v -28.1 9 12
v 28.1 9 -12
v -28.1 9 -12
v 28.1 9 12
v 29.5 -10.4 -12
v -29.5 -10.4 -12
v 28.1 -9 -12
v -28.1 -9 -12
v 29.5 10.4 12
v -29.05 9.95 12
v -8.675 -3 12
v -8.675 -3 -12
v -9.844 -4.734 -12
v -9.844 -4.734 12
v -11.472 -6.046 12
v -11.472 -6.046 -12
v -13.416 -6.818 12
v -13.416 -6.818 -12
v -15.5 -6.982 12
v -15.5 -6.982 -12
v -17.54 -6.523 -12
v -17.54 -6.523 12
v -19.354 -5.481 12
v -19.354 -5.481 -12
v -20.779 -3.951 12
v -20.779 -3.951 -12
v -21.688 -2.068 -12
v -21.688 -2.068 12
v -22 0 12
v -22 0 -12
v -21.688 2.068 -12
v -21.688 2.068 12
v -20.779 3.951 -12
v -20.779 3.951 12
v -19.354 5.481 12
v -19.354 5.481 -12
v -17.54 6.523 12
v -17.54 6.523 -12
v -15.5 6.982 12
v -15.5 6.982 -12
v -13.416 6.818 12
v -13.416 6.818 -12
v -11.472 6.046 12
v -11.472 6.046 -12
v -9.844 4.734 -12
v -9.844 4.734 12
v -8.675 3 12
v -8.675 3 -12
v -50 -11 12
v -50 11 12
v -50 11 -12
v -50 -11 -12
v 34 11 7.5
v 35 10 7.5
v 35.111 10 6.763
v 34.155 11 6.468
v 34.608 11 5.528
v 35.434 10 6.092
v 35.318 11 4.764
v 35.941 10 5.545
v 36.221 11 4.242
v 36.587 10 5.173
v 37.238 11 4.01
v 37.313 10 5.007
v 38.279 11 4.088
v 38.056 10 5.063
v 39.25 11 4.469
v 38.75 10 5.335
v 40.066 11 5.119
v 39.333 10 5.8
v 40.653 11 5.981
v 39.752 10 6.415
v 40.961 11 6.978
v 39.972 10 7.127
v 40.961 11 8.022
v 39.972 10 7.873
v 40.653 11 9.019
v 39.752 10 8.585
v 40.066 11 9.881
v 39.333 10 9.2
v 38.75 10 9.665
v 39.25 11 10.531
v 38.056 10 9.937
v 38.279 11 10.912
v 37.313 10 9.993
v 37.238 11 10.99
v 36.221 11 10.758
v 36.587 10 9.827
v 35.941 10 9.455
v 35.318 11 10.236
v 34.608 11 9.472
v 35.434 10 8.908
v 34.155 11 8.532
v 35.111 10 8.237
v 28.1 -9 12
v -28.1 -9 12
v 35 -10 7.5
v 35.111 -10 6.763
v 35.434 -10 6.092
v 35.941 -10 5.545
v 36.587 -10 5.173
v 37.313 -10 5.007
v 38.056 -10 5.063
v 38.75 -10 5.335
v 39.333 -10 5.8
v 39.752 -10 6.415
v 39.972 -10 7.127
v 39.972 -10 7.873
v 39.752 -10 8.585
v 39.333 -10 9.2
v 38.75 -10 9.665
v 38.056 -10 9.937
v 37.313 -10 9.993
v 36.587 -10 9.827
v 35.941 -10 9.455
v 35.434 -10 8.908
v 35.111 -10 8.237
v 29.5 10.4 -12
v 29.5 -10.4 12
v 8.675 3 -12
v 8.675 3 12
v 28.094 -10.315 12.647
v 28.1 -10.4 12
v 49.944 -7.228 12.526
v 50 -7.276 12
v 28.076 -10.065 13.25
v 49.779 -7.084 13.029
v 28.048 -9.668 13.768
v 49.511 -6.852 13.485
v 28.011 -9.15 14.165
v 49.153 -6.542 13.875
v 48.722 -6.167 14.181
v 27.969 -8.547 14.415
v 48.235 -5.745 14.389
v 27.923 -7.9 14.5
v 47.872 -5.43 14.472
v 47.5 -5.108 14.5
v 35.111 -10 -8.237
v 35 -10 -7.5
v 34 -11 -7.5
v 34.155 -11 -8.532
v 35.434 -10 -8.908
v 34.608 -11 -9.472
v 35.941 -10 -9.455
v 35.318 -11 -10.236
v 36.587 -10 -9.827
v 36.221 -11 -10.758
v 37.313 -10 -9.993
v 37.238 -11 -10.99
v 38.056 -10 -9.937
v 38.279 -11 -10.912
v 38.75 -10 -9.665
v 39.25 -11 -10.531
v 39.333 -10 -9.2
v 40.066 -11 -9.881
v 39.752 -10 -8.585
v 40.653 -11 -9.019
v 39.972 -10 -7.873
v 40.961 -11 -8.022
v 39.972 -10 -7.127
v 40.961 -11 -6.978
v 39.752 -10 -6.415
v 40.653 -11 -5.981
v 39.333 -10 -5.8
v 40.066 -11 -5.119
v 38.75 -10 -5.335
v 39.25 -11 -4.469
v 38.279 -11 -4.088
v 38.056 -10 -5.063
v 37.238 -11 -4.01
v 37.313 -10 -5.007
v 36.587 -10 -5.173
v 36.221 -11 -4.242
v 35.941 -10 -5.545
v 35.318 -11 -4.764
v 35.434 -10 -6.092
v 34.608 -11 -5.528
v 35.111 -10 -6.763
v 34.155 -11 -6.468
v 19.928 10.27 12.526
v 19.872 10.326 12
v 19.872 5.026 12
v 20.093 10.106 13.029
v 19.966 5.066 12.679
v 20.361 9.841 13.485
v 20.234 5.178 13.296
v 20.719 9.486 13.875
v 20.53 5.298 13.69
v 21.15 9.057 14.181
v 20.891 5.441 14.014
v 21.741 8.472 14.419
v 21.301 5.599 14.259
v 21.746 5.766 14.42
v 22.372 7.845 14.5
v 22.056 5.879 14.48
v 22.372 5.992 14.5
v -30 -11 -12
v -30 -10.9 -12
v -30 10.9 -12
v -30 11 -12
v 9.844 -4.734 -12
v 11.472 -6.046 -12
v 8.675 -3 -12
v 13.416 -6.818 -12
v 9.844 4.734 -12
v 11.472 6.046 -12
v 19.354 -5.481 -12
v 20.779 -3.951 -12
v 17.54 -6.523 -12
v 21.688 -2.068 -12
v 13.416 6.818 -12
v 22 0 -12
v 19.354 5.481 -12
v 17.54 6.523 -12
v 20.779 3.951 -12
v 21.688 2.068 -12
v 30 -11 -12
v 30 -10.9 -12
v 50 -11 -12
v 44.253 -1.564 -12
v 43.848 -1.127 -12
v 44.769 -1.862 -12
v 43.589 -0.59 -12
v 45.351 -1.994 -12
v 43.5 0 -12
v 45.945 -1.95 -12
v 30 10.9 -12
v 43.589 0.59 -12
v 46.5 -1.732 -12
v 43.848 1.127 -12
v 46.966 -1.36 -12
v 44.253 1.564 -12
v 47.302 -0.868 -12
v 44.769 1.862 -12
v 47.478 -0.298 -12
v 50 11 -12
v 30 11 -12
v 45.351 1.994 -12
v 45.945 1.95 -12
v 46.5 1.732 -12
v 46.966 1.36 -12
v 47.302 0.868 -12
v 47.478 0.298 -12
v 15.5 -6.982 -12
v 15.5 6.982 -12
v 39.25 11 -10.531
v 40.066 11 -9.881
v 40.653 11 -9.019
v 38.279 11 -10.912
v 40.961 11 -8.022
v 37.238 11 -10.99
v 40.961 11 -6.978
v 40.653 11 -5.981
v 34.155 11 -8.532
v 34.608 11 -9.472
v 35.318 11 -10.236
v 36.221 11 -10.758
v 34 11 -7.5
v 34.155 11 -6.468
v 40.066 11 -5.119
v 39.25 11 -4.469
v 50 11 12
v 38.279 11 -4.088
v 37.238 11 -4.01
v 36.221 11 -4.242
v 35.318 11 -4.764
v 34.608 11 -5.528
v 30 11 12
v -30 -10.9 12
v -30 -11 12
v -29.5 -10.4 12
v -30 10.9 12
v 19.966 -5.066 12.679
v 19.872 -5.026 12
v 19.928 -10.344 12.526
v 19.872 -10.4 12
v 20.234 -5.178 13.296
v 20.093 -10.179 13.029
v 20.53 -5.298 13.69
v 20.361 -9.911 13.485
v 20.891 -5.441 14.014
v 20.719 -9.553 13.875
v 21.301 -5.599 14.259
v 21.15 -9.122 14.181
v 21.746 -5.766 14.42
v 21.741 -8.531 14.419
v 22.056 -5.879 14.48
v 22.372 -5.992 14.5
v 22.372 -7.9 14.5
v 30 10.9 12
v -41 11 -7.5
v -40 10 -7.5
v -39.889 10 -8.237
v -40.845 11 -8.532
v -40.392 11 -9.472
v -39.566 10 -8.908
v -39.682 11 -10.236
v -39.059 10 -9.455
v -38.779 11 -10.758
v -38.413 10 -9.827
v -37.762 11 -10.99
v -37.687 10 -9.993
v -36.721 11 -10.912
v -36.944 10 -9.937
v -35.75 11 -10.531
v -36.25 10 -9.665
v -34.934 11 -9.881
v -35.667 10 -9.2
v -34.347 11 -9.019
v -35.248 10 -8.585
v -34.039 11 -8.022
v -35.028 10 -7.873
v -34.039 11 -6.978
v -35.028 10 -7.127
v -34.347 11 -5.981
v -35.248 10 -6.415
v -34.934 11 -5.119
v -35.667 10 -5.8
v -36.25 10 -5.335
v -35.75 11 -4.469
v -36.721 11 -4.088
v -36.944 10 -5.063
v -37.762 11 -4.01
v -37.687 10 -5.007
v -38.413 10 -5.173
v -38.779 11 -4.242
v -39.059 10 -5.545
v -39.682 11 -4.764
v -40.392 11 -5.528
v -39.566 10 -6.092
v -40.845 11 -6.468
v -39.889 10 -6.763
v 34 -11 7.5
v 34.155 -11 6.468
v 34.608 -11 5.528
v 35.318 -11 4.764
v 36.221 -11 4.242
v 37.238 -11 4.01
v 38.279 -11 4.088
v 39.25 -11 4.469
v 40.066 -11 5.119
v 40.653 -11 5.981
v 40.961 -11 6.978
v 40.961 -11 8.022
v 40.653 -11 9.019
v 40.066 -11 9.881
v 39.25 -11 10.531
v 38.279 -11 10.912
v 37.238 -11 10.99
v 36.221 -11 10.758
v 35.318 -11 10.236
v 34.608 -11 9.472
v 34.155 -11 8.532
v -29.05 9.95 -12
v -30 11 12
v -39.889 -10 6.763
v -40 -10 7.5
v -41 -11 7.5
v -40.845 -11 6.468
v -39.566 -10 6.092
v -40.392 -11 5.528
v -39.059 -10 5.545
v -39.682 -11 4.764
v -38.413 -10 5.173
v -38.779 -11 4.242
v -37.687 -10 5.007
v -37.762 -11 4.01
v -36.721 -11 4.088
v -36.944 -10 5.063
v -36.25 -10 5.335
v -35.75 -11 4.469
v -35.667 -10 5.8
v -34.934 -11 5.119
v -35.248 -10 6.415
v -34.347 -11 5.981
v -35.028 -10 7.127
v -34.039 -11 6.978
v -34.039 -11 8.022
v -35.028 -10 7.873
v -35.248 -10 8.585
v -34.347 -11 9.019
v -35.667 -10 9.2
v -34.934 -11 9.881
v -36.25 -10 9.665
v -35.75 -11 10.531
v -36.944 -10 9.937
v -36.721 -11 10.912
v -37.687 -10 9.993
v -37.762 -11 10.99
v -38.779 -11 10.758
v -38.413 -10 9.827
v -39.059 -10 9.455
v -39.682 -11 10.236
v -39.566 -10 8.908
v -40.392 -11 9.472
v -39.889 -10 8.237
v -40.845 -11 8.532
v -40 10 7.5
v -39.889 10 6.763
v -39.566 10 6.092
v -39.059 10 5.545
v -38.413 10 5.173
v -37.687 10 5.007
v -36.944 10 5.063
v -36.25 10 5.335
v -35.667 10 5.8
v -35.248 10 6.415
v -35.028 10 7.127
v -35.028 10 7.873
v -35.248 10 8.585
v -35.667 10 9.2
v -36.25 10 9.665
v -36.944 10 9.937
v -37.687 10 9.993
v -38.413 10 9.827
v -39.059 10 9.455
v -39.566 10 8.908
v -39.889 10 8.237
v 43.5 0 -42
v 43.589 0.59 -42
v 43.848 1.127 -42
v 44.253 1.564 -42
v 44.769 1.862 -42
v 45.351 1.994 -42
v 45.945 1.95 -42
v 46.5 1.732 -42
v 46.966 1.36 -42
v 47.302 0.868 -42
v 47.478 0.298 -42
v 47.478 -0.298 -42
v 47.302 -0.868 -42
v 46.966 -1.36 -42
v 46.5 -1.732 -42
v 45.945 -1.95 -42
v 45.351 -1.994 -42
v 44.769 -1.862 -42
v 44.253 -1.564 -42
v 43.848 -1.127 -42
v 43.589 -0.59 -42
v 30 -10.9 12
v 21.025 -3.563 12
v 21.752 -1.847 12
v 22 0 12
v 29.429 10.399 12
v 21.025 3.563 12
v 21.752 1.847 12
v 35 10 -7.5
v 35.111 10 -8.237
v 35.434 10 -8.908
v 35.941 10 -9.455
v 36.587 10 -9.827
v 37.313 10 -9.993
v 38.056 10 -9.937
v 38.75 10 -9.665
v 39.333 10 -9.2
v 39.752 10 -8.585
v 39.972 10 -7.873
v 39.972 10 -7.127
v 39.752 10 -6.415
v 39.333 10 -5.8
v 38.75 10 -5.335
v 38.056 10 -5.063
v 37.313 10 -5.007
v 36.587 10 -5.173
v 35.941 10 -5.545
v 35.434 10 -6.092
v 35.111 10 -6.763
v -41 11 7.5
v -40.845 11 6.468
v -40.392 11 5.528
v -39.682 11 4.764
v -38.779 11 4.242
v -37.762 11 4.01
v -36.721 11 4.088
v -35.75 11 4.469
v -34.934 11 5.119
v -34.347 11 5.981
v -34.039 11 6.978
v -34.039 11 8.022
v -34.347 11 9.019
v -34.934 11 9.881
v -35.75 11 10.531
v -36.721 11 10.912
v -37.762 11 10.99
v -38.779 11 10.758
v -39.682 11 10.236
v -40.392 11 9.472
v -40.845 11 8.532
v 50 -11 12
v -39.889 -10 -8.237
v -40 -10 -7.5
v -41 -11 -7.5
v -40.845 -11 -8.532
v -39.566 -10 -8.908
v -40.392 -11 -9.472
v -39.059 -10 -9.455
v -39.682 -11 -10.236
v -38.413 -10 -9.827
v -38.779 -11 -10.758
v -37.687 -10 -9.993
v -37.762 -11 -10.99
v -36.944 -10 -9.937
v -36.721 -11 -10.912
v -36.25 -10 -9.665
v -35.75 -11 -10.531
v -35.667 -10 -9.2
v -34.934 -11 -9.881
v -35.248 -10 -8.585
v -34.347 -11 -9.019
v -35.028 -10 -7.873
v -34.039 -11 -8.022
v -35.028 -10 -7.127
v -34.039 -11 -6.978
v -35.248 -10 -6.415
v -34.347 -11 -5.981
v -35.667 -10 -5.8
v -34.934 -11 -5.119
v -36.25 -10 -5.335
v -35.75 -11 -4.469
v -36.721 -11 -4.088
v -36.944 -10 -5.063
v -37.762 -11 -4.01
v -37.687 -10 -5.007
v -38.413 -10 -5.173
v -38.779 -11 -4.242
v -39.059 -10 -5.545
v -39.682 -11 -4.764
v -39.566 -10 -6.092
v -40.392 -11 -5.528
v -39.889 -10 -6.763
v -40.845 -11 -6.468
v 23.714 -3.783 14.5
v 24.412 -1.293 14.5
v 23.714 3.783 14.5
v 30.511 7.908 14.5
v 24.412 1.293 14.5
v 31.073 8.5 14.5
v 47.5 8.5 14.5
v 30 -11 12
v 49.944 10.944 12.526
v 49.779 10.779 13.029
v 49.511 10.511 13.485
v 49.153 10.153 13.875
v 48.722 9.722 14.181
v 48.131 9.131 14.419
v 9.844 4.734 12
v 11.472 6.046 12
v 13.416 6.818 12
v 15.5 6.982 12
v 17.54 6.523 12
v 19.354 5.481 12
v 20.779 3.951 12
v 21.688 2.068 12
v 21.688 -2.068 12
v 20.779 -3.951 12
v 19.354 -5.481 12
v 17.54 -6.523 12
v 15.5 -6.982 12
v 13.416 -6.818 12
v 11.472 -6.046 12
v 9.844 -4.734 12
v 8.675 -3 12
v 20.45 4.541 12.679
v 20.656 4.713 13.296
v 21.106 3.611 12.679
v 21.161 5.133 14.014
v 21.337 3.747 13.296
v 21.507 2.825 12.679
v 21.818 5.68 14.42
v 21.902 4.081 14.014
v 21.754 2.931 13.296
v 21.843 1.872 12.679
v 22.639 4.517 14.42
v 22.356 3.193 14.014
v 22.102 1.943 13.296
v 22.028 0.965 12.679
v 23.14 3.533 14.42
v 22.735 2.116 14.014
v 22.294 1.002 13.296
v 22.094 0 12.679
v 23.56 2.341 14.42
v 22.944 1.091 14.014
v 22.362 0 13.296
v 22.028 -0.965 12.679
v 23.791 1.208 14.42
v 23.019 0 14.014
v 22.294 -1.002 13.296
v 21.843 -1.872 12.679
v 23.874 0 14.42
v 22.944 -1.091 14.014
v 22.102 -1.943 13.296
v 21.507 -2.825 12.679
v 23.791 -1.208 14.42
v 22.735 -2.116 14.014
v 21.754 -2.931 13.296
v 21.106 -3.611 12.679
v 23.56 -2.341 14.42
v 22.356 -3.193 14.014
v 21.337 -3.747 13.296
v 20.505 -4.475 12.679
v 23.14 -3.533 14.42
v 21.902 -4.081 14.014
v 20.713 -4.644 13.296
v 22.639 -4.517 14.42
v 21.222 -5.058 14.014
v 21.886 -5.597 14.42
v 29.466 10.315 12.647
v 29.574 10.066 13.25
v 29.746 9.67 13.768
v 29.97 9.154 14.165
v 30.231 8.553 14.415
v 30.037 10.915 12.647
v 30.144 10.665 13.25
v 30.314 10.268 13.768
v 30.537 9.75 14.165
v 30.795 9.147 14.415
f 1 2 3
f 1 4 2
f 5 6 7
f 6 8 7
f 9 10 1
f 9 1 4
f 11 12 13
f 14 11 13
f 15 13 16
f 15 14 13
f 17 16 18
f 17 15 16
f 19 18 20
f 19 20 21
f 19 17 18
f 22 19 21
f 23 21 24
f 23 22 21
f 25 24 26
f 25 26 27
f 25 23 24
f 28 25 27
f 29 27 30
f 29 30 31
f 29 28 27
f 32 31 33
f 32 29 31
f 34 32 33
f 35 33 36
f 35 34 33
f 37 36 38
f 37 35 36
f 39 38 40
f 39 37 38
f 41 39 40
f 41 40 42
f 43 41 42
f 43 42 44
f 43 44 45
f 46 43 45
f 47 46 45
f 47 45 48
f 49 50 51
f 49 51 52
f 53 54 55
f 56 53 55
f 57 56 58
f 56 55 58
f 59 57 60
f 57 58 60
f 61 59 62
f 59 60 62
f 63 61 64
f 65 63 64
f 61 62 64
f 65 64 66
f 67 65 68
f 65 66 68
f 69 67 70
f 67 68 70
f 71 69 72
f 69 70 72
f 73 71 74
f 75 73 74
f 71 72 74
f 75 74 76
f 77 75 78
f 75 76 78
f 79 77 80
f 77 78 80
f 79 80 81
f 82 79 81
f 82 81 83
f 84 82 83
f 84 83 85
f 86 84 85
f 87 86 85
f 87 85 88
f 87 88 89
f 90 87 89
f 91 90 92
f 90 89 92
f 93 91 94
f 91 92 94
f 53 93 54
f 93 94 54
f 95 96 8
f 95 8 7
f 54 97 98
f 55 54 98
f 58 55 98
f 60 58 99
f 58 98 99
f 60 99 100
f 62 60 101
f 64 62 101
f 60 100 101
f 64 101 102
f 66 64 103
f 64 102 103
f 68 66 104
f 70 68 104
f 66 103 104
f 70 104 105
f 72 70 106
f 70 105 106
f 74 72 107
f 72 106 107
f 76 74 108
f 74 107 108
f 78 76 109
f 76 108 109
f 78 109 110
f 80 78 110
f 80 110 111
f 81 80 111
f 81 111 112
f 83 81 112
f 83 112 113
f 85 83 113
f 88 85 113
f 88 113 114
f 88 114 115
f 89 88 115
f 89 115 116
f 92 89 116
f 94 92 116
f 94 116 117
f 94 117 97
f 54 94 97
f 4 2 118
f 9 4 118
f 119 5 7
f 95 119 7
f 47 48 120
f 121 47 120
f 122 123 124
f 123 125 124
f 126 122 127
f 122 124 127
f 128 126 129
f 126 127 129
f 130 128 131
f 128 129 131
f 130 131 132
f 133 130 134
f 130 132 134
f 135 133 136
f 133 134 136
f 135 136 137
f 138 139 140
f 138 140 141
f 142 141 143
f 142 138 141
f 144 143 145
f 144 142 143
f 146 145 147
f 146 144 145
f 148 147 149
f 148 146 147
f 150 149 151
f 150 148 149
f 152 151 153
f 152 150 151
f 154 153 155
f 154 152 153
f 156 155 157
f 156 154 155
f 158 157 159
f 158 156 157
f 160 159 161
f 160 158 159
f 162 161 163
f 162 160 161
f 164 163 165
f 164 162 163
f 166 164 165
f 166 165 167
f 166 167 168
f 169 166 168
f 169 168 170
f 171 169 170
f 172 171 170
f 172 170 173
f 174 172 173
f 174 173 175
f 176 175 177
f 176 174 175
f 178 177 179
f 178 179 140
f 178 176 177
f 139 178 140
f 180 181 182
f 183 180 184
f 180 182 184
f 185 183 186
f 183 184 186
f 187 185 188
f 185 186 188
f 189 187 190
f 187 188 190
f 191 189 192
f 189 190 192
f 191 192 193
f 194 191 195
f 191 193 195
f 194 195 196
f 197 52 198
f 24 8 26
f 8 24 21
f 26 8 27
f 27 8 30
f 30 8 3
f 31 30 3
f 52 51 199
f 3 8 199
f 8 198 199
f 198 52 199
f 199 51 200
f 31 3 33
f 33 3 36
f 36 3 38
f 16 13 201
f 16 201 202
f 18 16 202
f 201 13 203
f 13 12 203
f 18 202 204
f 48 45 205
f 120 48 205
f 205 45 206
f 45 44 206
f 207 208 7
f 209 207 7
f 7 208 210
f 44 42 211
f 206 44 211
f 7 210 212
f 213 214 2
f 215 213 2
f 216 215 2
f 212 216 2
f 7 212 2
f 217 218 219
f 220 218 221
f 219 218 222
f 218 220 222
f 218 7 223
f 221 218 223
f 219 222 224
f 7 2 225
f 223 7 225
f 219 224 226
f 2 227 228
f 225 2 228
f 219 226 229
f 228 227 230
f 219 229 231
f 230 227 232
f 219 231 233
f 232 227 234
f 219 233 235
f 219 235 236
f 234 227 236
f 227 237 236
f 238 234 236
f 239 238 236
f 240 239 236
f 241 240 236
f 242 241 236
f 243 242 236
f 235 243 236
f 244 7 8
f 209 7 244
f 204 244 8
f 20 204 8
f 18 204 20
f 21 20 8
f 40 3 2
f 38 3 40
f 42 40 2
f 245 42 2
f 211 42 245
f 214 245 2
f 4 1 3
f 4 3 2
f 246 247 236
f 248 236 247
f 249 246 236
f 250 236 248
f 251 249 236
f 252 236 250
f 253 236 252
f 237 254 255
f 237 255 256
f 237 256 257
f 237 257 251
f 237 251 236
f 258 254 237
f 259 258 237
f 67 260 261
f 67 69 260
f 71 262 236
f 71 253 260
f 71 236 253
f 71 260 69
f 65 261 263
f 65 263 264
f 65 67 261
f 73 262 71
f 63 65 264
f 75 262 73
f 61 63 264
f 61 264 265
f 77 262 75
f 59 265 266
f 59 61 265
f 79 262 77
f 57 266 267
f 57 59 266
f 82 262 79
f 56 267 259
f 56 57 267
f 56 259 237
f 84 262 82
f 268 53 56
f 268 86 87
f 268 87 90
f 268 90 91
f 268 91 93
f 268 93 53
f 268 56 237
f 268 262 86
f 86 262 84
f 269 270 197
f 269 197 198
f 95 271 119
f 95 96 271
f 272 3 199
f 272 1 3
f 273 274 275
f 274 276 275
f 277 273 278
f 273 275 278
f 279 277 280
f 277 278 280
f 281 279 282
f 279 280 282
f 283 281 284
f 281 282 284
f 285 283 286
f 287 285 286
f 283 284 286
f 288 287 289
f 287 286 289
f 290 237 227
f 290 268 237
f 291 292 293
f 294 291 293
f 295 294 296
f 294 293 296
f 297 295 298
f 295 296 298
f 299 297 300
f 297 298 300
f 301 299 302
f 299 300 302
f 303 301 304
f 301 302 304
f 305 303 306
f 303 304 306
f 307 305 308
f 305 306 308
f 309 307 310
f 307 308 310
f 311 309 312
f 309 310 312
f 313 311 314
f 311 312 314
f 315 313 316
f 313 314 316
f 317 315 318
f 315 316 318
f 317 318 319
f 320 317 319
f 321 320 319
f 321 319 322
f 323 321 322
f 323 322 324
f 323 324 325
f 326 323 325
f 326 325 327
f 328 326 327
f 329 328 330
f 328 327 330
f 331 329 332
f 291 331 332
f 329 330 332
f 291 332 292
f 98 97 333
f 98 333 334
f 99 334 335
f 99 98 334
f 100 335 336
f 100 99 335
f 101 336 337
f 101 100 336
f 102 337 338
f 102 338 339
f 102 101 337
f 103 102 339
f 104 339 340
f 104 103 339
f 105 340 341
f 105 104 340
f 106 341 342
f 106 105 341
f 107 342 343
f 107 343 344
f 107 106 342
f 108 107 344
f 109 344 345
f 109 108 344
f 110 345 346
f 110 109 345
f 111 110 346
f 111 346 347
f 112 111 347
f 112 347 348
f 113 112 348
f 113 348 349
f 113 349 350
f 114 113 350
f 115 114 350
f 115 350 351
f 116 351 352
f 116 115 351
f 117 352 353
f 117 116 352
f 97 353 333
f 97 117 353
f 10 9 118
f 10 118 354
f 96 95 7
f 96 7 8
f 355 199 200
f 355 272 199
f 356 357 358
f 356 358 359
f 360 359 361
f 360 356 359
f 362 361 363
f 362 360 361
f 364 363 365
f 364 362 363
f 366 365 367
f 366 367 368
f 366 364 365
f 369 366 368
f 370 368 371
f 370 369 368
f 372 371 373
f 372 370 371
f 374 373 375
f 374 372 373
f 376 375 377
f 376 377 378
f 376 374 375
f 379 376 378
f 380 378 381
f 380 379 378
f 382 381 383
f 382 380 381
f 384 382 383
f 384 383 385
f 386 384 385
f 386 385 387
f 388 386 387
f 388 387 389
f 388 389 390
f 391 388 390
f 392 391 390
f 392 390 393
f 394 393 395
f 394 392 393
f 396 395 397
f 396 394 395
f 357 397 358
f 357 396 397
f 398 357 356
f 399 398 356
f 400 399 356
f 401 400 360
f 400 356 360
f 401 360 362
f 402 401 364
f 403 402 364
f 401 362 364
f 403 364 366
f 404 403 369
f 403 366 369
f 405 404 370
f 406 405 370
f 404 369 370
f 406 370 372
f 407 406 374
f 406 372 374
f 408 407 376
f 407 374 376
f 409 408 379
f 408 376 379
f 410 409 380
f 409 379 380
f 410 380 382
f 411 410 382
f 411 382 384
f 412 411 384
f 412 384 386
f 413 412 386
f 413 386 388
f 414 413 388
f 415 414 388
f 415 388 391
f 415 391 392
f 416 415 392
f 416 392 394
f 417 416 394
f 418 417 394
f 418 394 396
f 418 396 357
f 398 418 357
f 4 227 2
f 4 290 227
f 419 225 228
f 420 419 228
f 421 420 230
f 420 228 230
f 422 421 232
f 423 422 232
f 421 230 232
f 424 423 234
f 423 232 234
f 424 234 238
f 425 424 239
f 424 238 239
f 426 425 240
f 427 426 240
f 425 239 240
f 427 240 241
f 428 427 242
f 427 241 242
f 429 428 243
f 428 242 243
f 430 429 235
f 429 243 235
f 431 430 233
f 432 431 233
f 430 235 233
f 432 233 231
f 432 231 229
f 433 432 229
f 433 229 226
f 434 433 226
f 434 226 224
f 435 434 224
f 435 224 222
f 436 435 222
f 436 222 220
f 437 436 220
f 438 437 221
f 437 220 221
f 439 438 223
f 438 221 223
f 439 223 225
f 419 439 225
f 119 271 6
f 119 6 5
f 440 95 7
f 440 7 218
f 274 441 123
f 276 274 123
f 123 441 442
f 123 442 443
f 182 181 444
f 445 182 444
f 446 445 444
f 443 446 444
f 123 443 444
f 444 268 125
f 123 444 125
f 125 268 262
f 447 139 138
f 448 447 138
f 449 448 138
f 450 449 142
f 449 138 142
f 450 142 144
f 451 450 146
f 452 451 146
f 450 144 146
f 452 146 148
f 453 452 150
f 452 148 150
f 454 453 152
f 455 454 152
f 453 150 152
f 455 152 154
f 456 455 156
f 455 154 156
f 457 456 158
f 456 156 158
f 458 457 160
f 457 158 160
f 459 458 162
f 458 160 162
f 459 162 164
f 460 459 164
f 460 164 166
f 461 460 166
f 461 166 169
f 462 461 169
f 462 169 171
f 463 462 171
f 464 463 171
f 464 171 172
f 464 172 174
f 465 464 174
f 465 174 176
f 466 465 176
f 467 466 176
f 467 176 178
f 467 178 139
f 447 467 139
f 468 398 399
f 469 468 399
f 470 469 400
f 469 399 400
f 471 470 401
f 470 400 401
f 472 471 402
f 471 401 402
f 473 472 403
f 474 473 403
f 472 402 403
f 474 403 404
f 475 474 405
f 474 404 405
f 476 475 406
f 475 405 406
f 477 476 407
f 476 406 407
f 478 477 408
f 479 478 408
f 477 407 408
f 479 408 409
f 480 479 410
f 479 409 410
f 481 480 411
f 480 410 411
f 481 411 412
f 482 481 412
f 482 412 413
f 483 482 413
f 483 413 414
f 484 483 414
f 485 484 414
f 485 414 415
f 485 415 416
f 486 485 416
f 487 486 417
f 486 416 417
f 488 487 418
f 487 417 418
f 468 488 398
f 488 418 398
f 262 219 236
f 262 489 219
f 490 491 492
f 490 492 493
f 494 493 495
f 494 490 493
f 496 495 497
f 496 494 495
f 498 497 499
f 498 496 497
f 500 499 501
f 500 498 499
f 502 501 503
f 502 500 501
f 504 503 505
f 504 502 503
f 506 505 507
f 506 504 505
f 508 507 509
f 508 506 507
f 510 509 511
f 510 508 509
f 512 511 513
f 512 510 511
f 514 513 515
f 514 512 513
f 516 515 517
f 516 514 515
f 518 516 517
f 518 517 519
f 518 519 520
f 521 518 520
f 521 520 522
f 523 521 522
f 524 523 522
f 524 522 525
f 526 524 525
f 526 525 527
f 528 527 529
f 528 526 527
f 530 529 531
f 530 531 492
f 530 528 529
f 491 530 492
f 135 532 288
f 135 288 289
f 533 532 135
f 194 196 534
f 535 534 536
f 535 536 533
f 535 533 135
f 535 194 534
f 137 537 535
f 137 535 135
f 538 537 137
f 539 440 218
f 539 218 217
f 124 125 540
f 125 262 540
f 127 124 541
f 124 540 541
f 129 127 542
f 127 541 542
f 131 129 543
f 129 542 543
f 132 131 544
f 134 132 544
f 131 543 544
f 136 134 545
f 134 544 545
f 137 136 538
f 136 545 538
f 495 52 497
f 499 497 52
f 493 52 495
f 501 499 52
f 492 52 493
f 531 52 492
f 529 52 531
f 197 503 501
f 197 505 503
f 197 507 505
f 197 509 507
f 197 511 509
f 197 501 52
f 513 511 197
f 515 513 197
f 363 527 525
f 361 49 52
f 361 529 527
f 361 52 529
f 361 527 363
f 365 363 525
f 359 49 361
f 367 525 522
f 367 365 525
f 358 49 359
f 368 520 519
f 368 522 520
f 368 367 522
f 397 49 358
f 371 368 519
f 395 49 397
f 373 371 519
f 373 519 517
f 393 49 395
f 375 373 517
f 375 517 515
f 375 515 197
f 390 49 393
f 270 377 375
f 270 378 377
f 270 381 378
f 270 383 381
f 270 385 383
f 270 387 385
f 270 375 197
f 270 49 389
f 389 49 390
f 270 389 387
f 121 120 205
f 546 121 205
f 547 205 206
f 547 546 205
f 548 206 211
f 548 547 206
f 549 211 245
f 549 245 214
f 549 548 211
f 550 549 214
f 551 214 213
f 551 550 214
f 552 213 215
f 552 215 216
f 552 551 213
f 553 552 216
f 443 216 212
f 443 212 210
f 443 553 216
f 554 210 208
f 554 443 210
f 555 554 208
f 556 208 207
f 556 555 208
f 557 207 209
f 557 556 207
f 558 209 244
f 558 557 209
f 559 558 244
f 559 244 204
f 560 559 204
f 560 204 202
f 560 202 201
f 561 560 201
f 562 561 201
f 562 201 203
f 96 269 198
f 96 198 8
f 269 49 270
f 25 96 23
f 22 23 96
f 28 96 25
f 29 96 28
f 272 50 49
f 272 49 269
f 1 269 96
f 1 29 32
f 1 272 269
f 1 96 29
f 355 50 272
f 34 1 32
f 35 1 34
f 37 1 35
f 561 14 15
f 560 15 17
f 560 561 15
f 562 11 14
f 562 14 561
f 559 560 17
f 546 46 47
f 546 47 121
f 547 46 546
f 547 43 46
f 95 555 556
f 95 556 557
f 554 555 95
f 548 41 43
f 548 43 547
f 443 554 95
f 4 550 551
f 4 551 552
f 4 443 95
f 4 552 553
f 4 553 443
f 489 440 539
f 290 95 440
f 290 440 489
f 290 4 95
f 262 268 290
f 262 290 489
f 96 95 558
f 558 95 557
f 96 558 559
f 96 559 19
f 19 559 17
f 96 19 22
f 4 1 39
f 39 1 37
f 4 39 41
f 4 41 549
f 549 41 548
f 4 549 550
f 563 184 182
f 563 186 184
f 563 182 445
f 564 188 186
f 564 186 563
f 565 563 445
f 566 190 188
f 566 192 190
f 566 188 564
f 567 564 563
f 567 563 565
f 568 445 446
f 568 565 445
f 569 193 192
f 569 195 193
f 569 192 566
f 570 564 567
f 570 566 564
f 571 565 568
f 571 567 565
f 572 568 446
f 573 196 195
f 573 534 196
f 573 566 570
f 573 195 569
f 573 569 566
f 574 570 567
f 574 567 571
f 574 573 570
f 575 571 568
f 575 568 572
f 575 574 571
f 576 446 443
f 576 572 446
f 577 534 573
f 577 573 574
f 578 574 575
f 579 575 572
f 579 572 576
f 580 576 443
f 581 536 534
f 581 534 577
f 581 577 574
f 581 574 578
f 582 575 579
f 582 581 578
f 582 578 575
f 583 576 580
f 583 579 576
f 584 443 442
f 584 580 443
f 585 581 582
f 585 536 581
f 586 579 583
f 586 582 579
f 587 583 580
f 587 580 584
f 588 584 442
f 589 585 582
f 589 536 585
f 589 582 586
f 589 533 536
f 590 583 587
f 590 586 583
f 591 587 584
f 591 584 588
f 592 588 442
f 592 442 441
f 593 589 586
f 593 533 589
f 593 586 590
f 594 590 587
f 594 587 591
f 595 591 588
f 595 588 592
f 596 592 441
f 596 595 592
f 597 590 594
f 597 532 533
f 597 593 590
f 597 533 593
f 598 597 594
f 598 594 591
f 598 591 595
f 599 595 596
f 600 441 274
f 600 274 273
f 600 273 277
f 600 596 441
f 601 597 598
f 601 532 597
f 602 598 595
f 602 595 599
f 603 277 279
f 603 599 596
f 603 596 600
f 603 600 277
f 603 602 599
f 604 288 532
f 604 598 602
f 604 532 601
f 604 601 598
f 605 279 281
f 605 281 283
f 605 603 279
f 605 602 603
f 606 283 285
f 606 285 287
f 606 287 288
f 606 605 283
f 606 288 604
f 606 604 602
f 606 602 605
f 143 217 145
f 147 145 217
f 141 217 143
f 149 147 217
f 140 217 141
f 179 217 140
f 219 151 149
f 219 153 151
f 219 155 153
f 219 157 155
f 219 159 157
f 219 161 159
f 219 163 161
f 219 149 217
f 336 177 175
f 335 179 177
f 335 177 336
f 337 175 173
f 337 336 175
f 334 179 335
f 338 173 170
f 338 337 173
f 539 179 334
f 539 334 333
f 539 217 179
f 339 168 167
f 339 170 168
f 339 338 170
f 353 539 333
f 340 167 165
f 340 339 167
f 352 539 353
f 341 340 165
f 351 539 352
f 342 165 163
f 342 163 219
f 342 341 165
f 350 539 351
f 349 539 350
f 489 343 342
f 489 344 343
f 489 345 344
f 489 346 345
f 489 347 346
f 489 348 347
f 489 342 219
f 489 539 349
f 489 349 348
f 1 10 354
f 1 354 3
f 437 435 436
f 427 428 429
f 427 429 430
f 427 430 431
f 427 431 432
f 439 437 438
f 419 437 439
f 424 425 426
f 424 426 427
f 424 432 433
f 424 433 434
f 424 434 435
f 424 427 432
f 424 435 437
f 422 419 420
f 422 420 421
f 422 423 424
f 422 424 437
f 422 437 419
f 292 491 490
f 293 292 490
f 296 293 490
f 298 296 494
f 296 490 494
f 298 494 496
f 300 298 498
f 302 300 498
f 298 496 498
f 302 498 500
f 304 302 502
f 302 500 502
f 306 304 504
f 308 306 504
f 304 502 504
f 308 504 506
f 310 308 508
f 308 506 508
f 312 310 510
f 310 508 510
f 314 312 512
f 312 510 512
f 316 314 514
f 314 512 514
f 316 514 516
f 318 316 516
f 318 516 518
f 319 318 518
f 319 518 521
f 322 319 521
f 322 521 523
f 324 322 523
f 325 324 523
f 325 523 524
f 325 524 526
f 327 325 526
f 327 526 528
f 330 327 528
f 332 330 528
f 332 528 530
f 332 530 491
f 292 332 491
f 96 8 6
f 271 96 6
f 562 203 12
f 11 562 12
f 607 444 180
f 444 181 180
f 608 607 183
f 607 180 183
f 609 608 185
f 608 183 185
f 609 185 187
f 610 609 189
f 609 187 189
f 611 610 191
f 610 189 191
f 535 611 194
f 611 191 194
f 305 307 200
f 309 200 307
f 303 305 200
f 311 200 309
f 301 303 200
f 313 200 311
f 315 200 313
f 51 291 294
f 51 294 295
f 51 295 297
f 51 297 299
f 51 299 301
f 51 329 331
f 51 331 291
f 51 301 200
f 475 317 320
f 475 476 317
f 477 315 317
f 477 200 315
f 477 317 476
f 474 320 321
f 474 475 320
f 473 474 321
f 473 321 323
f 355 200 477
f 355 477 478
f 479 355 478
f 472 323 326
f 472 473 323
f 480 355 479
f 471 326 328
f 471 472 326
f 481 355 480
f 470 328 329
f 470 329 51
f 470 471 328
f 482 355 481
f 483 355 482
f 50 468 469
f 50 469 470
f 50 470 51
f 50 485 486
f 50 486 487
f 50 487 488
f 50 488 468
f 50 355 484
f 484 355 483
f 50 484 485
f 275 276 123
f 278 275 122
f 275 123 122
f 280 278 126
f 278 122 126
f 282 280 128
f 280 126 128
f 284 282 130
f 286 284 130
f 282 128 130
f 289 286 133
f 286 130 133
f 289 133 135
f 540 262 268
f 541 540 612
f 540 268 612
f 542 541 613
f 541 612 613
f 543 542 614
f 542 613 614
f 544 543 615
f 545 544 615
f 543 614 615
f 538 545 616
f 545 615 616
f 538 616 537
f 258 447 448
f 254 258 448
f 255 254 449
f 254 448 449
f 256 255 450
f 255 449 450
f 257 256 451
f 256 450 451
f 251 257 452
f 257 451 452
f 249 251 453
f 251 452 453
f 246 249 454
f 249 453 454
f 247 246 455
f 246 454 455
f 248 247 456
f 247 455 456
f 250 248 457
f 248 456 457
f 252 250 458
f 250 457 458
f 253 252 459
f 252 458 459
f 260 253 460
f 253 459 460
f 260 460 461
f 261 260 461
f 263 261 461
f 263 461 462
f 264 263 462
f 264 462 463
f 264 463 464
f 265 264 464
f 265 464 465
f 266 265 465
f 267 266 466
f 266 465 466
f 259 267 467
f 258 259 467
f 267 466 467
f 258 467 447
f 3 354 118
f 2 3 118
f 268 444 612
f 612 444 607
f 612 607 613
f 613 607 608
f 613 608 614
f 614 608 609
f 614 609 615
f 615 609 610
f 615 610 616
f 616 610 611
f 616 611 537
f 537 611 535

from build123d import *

# Parameters (mm, degrees)
EXTRUDE_1_DEPTH    = 12
HOLE_WIZARD_M6_1_D = 5
CHAMFER_1_SIZE     = 1
EXTRUDE_2_DEPTH    = 24
EXTRUDE_2_2_DEPTH  = 24
EXTRUDE_3_DEPTH    = 2.5
FILLET_1_R         = 2.5
SKETCH_6_R         = 2
EXTRUDE_4_DEPTH    = 30


with BuildPart() as part:
    # 草图1 → 凸台-拉伸1 (new, symmetric)
    with BuildSketch(Plane.XY):
        Polygon((-30, 10.9), (-30, 11), (-50, 11), (-50, -11), (-30, -11), (-30, -10.9), (-28.1, -9), (28.1, -9), (30, -10.9), (30, -11), (50, -11), (50, 11), (30, 11), (30, 10.9), (28.1, 9), (-28.1, 9), align=None)
        with BuildLine():
            Line((-8.67544468, 3), (8.67544468, 3))
            ThreePointArc((8.67544468, 3), (22, 0), (8.67544468, -3))
            Line((8.67544468, -3), (-8.67544468, -3))
            ThreePointArc((-8.67544468, -3), (-22, 0), (-8.67544468, 3))
        make_face(mode=Mode.SUBTRACT)
    extrude(amount=EXTRUDE_1_DEPTH, both=True)

    # M6 螺纹孔1 (through all)
    with Locations(Plane(origin=(-37.5, 11, -7.5), x_dir=(1, 0, 0), z_dir=(0, 1, 0))):
        with Locations((0, 0), (0, -15), (75, 0), (75, -15)):
            Hole(HOLE_WIZARD_M6_1_D / 2)

    # 倒角1
    chamfer_1_edges = [part.edges().sort_by_distance(p)[0] for p in [
        (40, 11, 7.5),
        (40, -11, 7.5),
        (40, 11, -7.5),
        (40, -11, -7.5),
        (-35, 11, 7.5),
        (-35, -11, 7.5),
        (-35, 11, -7.5),
        (-35, -11, -7.5),
    ]]
    chamfer(chamfer_1_edges, length=CHAMFER_1_SIZE)

    # 草图6 → 凸台-拉伸4 (add)
    with BuildSketch(Plane(origin=(0, 0, -12), x_dir=(-1, 0, 0), z_dir=(0, 0, -1))):
        with Locations((-45.5, 0)):
            Circle(SKETCH_6_R)
    extrude(amount=EXTRUDE_4_DEPTH)


with BuildPart() as body_2:
    # 草图4 → 凸台-拉伸2 (new body)
    with BuildSketch(Plane.XY.offset(12)):
        Polygon((28.1, 9), (29.5, 10.4), (-29.05, 9.95), (-28.1, 9), align=None)
    extrude(amount=-EXTRUDE_2_DEPTH)


with BuildPart() as body_3:
    # 草图4 → Extrude 2 2 (new body)
    with BuildSketch(Plane.XY.offset(12)):
        Polygon((-29.5, -10.4), (29.5, -10.4), (28.1, -9), (-28.1, -9), align=None)
    extrude(amount=-EXTRUDE_2_2_DEPTH)


with BuildPart() as body_4:
    # 草图5 → 凸台-拉伸3 (new body)
    with BuildSketch(Plane.XY.offset(12)):
        with BuildLine():
            Line((19.871867852, 10.326000692), (19.871867852, 5.026420559))
            ThreePointArc((19.871867852, 5.026420559), (22, 0), (19.871867852, -5.026420559))
            Line((19.871867852, -5.026420559), (19.871867852, -10.4))
            Line((19.871867852, -10.4), (28.1, -10.4))
            Line((28.1, -10.4), (50, -7.276315303))
            Line((50, -7.276315303), (50, 11))
            Line((50, 11), (30, 11))
            Line((30, 11), (29.429485139, 10.399458041))
            Line((29.429485139, 10.399458041), (19.871867852, 10.326000692))
        make_face()
    extrude(amount=EXTRUDE_3_DEPTH)

    # 圆角1
    fillet_1_edges = [body_4.edges().sort_by_distance(p)[0] for p in [
        (29.71474257, 10.699729021, 14.5),
        (40, 11, 14.5),
        (50, 1.861842348, 14.5),
        (22, 0, 14.5),
        (23.985933926, -10.4, 14.5),
        (19.871867852, -7.713210279, 14.5),
        (19.871867852, 7.676210625, 14.5),
        (24.650676496, 10.362729367, 14.5),
        (39.05, -8.838157652, 14.5),
    ]]
    fillet(fillet_1_edges, radius=FILLET_1_R - 0.0001)  # a hair under: the kernel refuses the full size


solid = Compound([part.part, body_2.part, body_3.part, body_4.part])
